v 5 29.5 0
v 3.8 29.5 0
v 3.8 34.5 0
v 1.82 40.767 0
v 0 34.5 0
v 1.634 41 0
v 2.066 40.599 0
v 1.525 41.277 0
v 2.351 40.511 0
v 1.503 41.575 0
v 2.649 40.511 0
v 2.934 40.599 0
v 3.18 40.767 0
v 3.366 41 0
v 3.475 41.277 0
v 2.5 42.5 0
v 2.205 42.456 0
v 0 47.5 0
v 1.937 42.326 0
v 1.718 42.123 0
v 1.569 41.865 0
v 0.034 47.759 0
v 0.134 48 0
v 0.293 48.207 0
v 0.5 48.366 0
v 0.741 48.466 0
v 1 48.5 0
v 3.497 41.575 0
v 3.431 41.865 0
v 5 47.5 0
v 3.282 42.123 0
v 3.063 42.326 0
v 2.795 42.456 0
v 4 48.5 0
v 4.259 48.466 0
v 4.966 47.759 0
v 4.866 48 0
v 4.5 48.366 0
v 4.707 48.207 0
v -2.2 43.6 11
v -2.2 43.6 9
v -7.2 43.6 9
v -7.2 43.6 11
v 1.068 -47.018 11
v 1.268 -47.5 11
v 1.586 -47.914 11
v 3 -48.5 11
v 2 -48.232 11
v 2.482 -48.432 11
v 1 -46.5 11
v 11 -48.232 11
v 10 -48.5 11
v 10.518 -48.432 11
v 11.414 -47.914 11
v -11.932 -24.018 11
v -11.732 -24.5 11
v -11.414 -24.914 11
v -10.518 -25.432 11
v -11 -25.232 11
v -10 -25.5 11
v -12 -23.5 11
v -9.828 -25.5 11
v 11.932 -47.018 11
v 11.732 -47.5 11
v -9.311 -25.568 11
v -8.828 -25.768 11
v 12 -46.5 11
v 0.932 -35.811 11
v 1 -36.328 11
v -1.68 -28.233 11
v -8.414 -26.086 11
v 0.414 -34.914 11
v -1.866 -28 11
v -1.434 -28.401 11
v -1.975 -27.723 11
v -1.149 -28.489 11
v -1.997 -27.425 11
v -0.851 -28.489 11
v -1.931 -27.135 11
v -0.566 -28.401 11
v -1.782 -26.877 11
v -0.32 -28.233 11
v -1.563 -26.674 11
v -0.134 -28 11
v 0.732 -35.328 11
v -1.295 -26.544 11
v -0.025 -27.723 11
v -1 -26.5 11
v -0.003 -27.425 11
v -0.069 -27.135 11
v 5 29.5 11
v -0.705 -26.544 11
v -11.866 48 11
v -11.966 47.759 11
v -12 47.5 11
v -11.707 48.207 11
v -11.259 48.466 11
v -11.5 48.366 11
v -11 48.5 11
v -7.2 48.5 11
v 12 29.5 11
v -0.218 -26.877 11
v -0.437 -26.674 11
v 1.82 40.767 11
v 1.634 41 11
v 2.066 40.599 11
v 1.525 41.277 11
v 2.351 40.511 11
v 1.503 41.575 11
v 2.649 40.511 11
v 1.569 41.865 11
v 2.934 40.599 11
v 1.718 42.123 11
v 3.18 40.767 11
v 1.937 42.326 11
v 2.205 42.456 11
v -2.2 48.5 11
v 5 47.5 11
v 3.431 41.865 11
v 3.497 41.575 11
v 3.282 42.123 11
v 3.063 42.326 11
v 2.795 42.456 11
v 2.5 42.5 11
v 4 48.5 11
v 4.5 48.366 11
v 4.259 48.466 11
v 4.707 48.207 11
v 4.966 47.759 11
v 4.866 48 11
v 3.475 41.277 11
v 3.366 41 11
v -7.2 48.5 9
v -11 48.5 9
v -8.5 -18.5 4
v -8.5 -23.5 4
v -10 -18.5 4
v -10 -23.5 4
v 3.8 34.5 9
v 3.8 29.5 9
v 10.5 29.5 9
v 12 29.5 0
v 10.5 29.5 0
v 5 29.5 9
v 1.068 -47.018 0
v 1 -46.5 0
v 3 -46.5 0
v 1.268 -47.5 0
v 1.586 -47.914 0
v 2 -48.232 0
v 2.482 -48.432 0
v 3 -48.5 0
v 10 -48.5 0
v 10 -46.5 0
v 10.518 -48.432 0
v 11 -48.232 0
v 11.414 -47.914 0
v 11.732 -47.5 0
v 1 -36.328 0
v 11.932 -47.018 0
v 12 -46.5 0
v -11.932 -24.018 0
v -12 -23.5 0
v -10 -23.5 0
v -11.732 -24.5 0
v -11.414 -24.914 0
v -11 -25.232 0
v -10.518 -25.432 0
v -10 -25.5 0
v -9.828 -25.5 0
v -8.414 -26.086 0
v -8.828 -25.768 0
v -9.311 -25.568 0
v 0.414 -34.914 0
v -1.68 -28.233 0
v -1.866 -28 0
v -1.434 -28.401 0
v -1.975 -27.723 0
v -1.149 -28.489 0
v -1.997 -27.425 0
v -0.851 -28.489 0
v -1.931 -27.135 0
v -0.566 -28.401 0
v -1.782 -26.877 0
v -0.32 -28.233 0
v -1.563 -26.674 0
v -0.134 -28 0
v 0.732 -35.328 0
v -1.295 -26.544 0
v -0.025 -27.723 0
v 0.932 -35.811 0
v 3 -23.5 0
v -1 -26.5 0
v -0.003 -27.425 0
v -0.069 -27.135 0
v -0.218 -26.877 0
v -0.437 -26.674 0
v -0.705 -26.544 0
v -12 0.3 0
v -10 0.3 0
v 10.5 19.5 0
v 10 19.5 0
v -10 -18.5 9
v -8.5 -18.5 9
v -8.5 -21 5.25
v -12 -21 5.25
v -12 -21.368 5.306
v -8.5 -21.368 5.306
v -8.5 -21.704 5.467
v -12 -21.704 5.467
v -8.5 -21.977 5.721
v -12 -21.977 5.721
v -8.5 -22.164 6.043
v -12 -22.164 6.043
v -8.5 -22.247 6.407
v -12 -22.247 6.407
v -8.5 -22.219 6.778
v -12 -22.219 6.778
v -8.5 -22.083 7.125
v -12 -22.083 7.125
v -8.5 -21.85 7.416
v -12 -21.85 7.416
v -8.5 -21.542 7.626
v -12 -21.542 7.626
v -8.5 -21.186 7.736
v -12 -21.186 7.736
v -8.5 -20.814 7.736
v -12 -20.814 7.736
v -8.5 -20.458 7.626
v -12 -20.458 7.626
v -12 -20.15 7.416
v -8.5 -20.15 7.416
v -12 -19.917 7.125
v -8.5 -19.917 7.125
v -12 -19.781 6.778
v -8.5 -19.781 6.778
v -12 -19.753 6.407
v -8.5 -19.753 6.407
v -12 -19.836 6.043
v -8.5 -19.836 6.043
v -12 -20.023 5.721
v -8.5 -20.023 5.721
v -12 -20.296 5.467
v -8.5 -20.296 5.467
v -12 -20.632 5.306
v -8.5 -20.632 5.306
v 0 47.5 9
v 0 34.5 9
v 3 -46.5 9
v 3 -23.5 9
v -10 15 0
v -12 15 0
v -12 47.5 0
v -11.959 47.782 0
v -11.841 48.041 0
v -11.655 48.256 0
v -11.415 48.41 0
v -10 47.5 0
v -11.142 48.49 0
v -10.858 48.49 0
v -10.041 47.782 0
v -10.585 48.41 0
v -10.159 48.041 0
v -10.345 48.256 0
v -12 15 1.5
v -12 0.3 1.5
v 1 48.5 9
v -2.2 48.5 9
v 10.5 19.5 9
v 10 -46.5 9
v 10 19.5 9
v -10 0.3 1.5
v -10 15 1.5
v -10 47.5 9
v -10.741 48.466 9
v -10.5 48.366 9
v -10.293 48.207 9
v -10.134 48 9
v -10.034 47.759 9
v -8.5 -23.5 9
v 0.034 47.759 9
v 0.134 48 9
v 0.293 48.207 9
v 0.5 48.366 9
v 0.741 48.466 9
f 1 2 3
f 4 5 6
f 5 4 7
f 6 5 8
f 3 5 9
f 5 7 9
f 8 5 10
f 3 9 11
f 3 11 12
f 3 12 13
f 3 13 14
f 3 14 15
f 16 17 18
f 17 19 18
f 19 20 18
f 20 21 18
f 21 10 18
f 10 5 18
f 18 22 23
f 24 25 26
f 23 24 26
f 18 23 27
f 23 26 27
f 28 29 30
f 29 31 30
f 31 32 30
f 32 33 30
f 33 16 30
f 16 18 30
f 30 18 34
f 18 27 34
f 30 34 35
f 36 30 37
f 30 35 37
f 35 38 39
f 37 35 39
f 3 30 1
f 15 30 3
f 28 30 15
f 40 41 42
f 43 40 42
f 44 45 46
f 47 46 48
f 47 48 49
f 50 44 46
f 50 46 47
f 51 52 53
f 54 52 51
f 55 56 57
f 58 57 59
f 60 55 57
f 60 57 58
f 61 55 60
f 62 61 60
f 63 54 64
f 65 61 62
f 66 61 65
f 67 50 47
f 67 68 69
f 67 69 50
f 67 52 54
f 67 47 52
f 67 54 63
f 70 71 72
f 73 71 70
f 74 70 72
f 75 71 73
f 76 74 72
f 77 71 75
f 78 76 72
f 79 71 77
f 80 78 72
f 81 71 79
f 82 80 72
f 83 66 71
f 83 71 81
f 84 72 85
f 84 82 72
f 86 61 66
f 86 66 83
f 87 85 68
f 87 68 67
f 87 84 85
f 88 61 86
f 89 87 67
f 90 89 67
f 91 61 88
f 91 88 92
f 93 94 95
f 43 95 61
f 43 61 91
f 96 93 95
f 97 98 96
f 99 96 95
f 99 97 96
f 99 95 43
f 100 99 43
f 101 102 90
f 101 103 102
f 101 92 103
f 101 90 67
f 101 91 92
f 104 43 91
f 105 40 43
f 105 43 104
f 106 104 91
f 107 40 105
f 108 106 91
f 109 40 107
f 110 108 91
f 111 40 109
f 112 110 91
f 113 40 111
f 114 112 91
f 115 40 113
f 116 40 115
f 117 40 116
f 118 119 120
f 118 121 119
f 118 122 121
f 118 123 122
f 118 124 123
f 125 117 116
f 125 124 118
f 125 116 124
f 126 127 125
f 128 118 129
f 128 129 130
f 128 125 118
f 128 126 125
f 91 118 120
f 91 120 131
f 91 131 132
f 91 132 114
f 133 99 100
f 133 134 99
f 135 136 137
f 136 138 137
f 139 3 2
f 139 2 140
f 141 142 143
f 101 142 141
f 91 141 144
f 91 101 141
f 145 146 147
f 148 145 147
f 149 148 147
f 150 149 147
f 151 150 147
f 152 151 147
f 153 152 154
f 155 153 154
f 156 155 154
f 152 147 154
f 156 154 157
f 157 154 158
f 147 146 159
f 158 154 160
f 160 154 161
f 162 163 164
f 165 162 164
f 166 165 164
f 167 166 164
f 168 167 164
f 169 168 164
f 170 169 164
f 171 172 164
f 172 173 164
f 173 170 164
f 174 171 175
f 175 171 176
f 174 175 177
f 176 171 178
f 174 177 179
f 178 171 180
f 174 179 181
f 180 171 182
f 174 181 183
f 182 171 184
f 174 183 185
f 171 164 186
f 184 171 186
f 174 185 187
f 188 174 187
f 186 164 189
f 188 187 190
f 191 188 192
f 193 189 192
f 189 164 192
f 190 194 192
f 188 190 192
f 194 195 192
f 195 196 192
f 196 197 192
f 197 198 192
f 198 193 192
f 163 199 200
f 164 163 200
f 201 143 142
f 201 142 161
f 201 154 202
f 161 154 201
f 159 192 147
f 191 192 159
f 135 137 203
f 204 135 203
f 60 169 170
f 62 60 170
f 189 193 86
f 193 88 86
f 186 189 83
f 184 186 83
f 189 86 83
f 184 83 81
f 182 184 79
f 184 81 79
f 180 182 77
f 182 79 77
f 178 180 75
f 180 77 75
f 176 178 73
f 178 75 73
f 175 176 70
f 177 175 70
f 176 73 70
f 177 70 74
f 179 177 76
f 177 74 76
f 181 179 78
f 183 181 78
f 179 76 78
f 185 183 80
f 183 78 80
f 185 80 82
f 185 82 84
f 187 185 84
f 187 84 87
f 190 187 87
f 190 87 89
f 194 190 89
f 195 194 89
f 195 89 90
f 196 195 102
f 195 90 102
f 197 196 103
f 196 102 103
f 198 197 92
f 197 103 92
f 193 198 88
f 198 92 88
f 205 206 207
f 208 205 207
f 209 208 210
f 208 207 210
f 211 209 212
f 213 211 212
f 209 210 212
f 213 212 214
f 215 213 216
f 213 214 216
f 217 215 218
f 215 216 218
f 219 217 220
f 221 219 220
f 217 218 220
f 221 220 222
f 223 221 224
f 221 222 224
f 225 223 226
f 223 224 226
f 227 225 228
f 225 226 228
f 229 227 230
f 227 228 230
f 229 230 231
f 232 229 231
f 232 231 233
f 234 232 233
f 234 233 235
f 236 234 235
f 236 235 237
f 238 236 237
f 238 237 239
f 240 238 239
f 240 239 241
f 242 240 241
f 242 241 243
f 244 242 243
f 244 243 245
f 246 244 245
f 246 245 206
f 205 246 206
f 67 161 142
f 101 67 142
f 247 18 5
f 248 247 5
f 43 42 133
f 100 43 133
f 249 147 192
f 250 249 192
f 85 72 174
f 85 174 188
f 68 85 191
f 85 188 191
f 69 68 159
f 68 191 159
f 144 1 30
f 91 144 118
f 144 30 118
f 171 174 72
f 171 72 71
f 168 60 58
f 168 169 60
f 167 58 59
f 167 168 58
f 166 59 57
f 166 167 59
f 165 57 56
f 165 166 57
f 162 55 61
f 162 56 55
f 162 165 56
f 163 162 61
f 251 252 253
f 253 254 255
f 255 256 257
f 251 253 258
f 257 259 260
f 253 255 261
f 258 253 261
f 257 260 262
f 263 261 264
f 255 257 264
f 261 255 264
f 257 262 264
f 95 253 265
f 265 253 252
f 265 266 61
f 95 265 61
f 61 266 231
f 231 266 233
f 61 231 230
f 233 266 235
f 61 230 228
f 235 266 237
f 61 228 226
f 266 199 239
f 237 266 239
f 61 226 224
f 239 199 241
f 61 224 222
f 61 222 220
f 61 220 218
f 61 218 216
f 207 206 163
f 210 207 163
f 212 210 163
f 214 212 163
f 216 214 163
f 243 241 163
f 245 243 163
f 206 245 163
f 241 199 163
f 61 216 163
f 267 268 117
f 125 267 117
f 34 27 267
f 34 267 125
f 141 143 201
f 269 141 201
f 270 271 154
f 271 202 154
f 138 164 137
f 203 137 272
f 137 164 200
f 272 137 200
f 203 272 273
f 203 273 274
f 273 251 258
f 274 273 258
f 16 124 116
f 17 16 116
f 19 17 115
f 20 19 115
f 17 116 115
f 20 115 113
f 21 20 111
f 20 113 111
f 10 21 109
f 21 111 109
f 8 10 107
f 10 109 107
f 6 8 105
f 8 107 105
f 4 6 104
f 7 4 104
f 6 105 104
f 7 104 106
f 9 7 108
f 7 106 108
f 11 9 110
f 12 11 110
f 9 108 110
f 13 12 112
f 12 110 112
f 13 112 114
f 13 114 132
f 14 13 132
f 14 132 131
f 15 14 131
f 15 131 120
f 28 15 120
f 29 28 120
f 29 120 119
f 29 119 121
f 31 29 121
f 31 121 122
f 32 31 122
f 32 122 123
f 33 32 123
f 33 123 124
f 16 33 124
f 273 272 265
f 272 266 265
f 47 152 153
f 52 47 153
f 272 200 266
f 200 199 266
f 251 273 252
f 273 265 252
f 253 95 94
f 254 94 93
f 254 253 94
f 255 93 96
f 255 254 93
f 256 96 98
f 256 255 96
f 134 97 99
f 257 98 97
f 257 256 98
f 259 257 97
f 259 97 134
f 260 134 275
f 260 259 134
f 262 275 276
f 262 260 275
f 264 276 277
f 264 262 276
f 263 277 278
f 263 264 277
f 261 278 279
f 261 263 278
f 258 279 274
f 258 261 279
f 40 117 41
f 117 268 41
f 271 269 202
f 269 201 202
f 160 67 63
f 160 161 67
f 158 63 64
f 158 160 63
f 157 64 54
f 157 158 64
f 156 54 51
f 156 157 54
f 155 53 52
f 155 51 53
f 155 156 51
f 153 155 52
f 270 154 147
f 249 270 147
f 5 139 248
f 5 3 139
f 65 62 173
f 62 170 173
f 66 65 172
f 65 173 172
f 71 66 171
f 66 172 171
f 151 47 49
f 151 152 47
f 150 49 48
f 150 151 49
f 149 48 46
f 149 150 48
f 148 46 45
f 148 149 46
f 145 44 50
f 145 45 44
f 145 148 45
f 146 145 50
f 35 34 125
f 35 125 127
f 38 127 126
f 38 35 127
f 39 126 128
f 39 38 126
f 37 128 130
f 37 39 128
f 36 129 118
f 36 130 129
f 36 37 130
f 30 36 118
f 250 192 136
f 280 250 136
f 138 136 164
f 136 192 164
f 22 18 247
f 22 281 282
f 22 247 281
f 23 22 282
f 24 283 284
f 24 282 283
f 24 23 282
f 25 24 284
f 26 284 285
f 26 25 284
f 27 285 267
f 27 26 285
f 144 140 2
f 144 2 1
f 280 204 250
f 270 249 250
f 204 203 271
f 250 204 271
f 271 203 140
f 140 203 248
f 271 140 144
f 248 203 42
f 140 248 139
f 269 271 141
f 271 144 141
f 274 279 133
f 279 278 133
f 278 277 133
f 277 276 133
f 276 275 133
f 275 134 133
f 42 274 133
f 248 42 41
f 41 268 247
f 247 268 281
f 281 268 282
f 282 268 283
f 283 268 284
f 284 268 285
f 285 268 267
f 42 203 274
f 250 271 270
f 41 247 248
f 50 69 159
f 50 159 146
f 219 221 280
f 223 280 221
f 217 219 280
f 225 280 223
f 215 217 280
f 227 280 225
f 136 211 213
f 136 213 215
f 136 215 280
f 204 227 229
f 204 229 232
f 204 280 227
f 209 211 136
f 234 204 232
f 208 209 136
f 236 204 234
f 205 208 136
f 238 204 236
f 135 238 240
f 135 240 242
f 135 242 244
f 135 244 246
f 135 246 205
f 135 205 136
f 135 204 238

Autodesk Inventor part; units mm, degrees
ref_plane "YZ Plane" through (0, 0, 0) normal (1, 0, 0) x (0, 1, 0)
ref_plane "XZ Plane" through (0, 0, 0) normal (0, 1, 0) x (-1, 0, 0)
sketch "Skizze1" plane through (0, 0, 0) normal (0, 0, 1) x (1, 0, 0)
  point P0 (0, 0)
ref_plane "Arbeitsebene1" through (0, 0, 0) normal (0, 0, 1) x (1, 0, 0)
sketch "Skizze2" plane through (0, 0, 0) normal (0, 0, 1) x (1, 0, 0)
  line L0 (-10, -0.5) -> (-12, -0.5) projected
  line L1 (-12, -0.5) -> (-12, -23.5) projected
  arc A0 (-12, -23.5) -> (-10, -25.5) centre (-10, -23.5) ccw projected
  line L2 (-10, -25.5) -> (-9.8284, -25.5) projected
  arc A1 (-8.4142, -26.0858) -> (-9.8284, -25.5) centre (-9.8284, -27.5) ccw projected
  line L3 (0.4142, -34.9142) -> (-8.4142, -26.0858) projected
  arc A2 (1, -36.3284) -> (0.4142, -34.9142) centre (-1, -36.3284) ccw projected
  line L4 (1, -36.3284) -> (1, -46.5) projected
  arc A3 (1, -46.5) -> (3, -48.5) centre (3, -46.5) ccw projected
  line L5 (3, -48.5) -> (10, -48.5) projected
  arc A4 (10, -48.5) -> (12, -46.5) centre (10, -46.5) ccw projected
  line L6 (12, -46.5) -> (12, 31.5) projected
  line L7 (11, 32.5) -> (10, 32.5) projected
  line L8 (10, 32.5) -> (10, -46.5) projected
  line L9 (10, -46.5) -> (3, -46.5) projected
  line L10 (3, -46.5) -> (3, -23.5) projected
  line L11 (3, -23.5) -> (-10, -23.5) projected
  line L12 (-10, -23.5) -> (-10, -0.5) projected
  arc A5 (1, 48.5) -> (0, 47.5) centre (1, 47.5) ccw projected
  line L13 (0, 47.5) -> (0, 32.5) projected
  line L14 (0, 32.5) -> (5, 32.5) projected
  line L15 (5, 32.5) -> (5, 47.5) projected
  arc A6 (5, 47.5) -> (4, 48.5) centre (4, 47.5) ccw projected
  line L16 (4, 48.5) -> (1, 48.5) projected
  line L17 (-12, 12.5) -> (-10, 12.5) projected
  line L18 (-10, 12.5) -> (-10, 47.5) projected
  arc A7 (-10, 47.5) -> (-12, 47.5) centre (-11, 47.5) ccw projected
  line L19 (-12, 47.5) -> (-12, 12.5) projected
  line L20 (-10, 12.5) -> (-10, -0.5) projected
  line L21 (-12, 12.5) -> (-10, 12.5) projected
  line L22 (-12, -0.5) -> (-12, 12.5) projected
  line L23 (-10, -0.5) -> (-12, -0.5) projected
  arc A8 (12, 31.5) -> (11, 32.5) centre (11, 31.5) ccw projected
  point P0 (0, 0)
extrude "Extrusion1" add sketch "Skizze2" along normal blind 9
sketch "Skizze3" plane through (0, 0, 9) normal (0, 0, 1) x (1, 0, 0)
  line L0 (-12, 47.5) -> (-12, -23.5) projected
  arc A0 (-12, -23.5) -> (-10, -25.5) centre (-10, -23.5) ccw projected
  line L1 (-10, -25.5) -> (-9.8284, -25.5) projected
  arc A1 (-8.4142, -26.0858) -> (-9.8284, -25.5) centre (-9.8284, -27.5) ccw projected
  line L2 (-8.4142, -26.0858) -> (0.4142, -34.9142) projected
  arc A2 (1, -36.3284) -> (0.4142, -34.9142) centre (-1, -36.3284) ccw projected
  line L3 (1, -36.3284) -> (1, -46.5) projected
  arc A3 (1, -46.5) -> (3, -48.5) centre (3, -46.5) ccw projected
  line L4 (3, -48.5) -> (10, -48.5) projected
  arc A4 (10, -48.5) -> (12, -46.5) centre (10, -46.5) ccw projected
  line L5 (12, -46.5) -> (12, 31.5) projected
  line L6 (11, 32.5) -> (10, 32.5) projected
  line L7 (10, 32.5) -> (10, -46.5) projected
  line L8 (10, -46.5) -> (3, -46.5) projected
  line L9 (3, -46.5) -> (3, -23.5) projected
  line L10 (3, -23.5) -> (-10, -23.5) projected
  line L11 (-10, -23.5) -> (-10, 47.5) projected
  arc A5 (-10, 47.5) -> (-12, 47.5) centre (-11, 47.5) ccw projected
  line L12 (0, 32.5) -> (5, 32.5) projected
  line L13 (5, 32.5) -> (5, 47.5) projected
  arc A6 (5, 47.5) -> (4, 48.5) centre (4, 47.5) ccw projected
  line L14 (4, 48.5) -> (1, 48.5) projected
  arc A7 (1, 48.5) -> (0, 47.5) centre (1, 47.5) ccw projected
  line L15 (0, 47.5) -> (0, 32.5) projected
  line L16 (10, 32.5) -> (5, 32.5) projected
  line L17 (-11, 48.5) -> (4, 48.5)
  arc A8 (12, 31.5) -> (11, 32.5) centre (11, 31.5) ccw projected
  point P0 (0, 0)
extrude "Extrusion2" add sketch "Skizze3" along normal blind 2
sketch "Skizze5" plane through (-10, -23.5, 0) normal (1, 0, 0) x (0, 0, -1)
  line L0 (0, 0) -> (0, 71) projected
  line L1 (0, 71) -> (-9, 71) projected
  line L2 (-9, 0) -> (-9, 71) projected
  line L3 (0, 0) -> (-9, 0) projected
  line L4 (-9, 0) -> (-9, 71) projected
  line L5 (-9, 0) -> (-4, 0)
  line L6 (-4, 0) -> (-4, 5)
  line L7 (-4, 5) -> (-9, 5)
  line L8 (-9, 5) -> (-9, 0)
  point P0 (0, 23.5)
  point P1 (-9, 5)
  dimension "d4" = 5
  dimension "d5" = 5
extrude "Extrusion3" add sketch "Skizze5" along normal blind 2.5 contours L3 L2 L7 L6
sketch "Skizze6" plane through (-7.5, -23.5, 0) normal (1, 0, 0) x (0, 0, -1)
  line L0 (-4, 0) -> (-4, 5) projected
  line L1 (-4, 0) -> (-9, 0) projected
  line L2 (-4, 5) -> (-9, 5)
  line L3 (-9, 5) -> (-9, 0)
  line L4 (-9, 0) -> (-4, 0)
  line L5 (-4, 0) -> (-4, 5)
  point P0 (0, 23.5)
extrude "Extrusion4" cut sketch "Skizze6" against normal blind 1
sketch "Skizze7" plane through (0, 0, 0) normal (0, 0, -1) x (-1, 0, 0)
  line L0 (0, 32.5) -> (-5, 32.5) projected
  line L1 (0, 32.5) -> (-3.8, 32.5)
  line L2 (-3.8, 32.5) -> (-3.8, 34.5)
  line L3 (-3.8, 34.5) -> (0, 34.5)
  line L4 (0, 34.5) -> (0, 32.5)
  point P0 (0, 0)
  dimension "d10" = 2
  dimension "d11" = 3.8
extrude "Extrusion5" cut sketch "Skizze7" against normal up to surface (9 mm away)
sketch "Skizze8" plane through (0, 0, 11) normal (0, 0, 1) x (1, 0, 0)
  line L0 (3.8, 32.5) -> (5, 32.5) projected
  line L1 (12, -46.5) -> (12, 31.5) projected
  line L2 (5, 32.5) -> (12, 32.5)
  line L3 (12, 32.5) -> (12, 29.5)
  line L4 (12, 29.5) -> (5, 29.5)
  line L5 (5, 29.5) -> (5, 32.5)
  point P0 (0, 0)
  dimension "d14" = 3
extrude "Extrusion6" cut sketch "Skizze8" against normal through all
sketch "Skizze9" plane through (5, 32.5, 0) normal (0, -1, 0) x (1, 0, 0)
  line L0 (-1.2, 0) -> (-1.2, 9) projected
  line L1 (0, 0) -> (0, 11) projected
  line L2 (-1.2, 0) -> (0, 0)
  line L3 (0, 0) -> (0, 9)
  line L4 (0, 9) -> (-1.2, 9)
  line L5 (-1.2, 9) -> (-1.2, 0)
  point P0 (-5, 0)
  dimension "d17" = 9
extrude "Extrusion7" add sketch "Skizze9" along normal blind 3
sketch "Skizze10" plane through (-12, -23.5, 0) normal (-1, 0, 0) x (0, 0, 1)
  line L0 (0, 0) -> (0, 71) projected
  line L1 (0, 23.8) -> (1.5, 23.8)
  line L2 (1.5, 23.8) -> (1.5, 38.5)
  line L3 (1.5, 38.5) -> (0, 38.5)
  line L4 (0, 38.5) -> (0, 23.8)
  line L5 (0, 71) -> (11, 71) projected
  point P0 (0, 23.5)
  point P1 (0, 38.5)
  dimension "d20" = 1.5
  dimension "d21" = 14.7
  dimension "d57" = 23.8
extrude "Extrusion8" cut sketch "Skizze10" against normal up to surface (22 mm away)
sketch "Skizze11" plane through (0, 0, 9) normal (0, 0, -1) x (-1, 0, 0)
  line L0 (-4, 48.5) -> (11, 48.5) projected
  line L1 (7.2, 48.5) -> (2.2, 48.5)
  line L2 (2.2, 48.5) -> (2.2, 43.6)
  line L3 (2.2, 43.6) -> (7.2, 43.6)
  line L4 (7.2, 43.6) -> (7.2, 48.5)
  line L5 (12, 47.5) -> (12, 15) projected
  point P0 (0, 0)
  point P1 (2.2, 48.5)
  dimension "d25" = 4.9
  dimension "d26" = 5
  dimension "d27" = 4.8
extrude "Extrusion9" cut sketch "Skizze11" against normal blind 3
sketch "Skizze12" plane through (0, 0, 0) normal (0, 0, -1) x (-1, 0, 0)
  line L0 (-3, -23.5) -> (10, -23.5) projected
  line L1 (-3, -46.5) -> (-3, -23.5) projected
  point P0 (0, 0)
  point P1 (1, -27.5)
  dimension "d30" = 4
  dimension "d31" = 4
hole "Bohrung1" at (-1, -27.5, 0) direction (0, 0, 1) diameter 2 end through all
sketch "Skizze13" plane through (0, 0, 0) normal (0, 0, -1) x (-1, 0, 0)
  line L0 (-5, 29.5) -> (-5, 47.5) projected
  line L1 (-4, 48.5) -> (-1, 48.5) projected
  point P0 (0, 0)
  point P1 (-2.5, 41.5)
  dimension "d39" = 2.5
  dimension "d40" = 7
hole "Bohrung2" at (2.5, 41.5, 0) direction (0, 0, 1) diameter 2 end through all
sketch "Skizze14" plane through (-8.5, -23.5, 0) normal (1, 0, 0) x (0, 0, -1)
  line L0 (-9, 5) -> (-4, 5) projected
  line L1 (-4, 5) -> (-4, 0) projected
  point P0 (0, 23.5)
  point P1 (-6.5, 2.5)
  dimension "d48" = 2.5
  dimension "d49" = 2.5
hole "Bohrung3" at (-8.5, -21, 6.5) direction (-1, 0, 0) diameter 2.5 end through all
sketch "Skizze16" plane through (0, 0, 0) normal (0, 0, -1) x (-1, 0, 0)
  line L0 (-5, 29.5) -> (-10, 29.5) projected
  line L1 (-10, 29.5) -> (-10.5, 29.5)
  line L2 (-10.5, 29.5) -> (-10.5, 19.5)
  line L3 (-10.5, 19.5) -> (-10, 19.5)
  line L4 (-10, 19.5) -> (-10, 29.5)
  point P0 (0, 0)
  dimension "d63" = 0.5
  dimension "d64" = 10
extrude "Extrusion11" cut sketch "Skizze16" against normal up to surface (9 mm away)
properties part number "Case" material "Holz (Eiche)"
